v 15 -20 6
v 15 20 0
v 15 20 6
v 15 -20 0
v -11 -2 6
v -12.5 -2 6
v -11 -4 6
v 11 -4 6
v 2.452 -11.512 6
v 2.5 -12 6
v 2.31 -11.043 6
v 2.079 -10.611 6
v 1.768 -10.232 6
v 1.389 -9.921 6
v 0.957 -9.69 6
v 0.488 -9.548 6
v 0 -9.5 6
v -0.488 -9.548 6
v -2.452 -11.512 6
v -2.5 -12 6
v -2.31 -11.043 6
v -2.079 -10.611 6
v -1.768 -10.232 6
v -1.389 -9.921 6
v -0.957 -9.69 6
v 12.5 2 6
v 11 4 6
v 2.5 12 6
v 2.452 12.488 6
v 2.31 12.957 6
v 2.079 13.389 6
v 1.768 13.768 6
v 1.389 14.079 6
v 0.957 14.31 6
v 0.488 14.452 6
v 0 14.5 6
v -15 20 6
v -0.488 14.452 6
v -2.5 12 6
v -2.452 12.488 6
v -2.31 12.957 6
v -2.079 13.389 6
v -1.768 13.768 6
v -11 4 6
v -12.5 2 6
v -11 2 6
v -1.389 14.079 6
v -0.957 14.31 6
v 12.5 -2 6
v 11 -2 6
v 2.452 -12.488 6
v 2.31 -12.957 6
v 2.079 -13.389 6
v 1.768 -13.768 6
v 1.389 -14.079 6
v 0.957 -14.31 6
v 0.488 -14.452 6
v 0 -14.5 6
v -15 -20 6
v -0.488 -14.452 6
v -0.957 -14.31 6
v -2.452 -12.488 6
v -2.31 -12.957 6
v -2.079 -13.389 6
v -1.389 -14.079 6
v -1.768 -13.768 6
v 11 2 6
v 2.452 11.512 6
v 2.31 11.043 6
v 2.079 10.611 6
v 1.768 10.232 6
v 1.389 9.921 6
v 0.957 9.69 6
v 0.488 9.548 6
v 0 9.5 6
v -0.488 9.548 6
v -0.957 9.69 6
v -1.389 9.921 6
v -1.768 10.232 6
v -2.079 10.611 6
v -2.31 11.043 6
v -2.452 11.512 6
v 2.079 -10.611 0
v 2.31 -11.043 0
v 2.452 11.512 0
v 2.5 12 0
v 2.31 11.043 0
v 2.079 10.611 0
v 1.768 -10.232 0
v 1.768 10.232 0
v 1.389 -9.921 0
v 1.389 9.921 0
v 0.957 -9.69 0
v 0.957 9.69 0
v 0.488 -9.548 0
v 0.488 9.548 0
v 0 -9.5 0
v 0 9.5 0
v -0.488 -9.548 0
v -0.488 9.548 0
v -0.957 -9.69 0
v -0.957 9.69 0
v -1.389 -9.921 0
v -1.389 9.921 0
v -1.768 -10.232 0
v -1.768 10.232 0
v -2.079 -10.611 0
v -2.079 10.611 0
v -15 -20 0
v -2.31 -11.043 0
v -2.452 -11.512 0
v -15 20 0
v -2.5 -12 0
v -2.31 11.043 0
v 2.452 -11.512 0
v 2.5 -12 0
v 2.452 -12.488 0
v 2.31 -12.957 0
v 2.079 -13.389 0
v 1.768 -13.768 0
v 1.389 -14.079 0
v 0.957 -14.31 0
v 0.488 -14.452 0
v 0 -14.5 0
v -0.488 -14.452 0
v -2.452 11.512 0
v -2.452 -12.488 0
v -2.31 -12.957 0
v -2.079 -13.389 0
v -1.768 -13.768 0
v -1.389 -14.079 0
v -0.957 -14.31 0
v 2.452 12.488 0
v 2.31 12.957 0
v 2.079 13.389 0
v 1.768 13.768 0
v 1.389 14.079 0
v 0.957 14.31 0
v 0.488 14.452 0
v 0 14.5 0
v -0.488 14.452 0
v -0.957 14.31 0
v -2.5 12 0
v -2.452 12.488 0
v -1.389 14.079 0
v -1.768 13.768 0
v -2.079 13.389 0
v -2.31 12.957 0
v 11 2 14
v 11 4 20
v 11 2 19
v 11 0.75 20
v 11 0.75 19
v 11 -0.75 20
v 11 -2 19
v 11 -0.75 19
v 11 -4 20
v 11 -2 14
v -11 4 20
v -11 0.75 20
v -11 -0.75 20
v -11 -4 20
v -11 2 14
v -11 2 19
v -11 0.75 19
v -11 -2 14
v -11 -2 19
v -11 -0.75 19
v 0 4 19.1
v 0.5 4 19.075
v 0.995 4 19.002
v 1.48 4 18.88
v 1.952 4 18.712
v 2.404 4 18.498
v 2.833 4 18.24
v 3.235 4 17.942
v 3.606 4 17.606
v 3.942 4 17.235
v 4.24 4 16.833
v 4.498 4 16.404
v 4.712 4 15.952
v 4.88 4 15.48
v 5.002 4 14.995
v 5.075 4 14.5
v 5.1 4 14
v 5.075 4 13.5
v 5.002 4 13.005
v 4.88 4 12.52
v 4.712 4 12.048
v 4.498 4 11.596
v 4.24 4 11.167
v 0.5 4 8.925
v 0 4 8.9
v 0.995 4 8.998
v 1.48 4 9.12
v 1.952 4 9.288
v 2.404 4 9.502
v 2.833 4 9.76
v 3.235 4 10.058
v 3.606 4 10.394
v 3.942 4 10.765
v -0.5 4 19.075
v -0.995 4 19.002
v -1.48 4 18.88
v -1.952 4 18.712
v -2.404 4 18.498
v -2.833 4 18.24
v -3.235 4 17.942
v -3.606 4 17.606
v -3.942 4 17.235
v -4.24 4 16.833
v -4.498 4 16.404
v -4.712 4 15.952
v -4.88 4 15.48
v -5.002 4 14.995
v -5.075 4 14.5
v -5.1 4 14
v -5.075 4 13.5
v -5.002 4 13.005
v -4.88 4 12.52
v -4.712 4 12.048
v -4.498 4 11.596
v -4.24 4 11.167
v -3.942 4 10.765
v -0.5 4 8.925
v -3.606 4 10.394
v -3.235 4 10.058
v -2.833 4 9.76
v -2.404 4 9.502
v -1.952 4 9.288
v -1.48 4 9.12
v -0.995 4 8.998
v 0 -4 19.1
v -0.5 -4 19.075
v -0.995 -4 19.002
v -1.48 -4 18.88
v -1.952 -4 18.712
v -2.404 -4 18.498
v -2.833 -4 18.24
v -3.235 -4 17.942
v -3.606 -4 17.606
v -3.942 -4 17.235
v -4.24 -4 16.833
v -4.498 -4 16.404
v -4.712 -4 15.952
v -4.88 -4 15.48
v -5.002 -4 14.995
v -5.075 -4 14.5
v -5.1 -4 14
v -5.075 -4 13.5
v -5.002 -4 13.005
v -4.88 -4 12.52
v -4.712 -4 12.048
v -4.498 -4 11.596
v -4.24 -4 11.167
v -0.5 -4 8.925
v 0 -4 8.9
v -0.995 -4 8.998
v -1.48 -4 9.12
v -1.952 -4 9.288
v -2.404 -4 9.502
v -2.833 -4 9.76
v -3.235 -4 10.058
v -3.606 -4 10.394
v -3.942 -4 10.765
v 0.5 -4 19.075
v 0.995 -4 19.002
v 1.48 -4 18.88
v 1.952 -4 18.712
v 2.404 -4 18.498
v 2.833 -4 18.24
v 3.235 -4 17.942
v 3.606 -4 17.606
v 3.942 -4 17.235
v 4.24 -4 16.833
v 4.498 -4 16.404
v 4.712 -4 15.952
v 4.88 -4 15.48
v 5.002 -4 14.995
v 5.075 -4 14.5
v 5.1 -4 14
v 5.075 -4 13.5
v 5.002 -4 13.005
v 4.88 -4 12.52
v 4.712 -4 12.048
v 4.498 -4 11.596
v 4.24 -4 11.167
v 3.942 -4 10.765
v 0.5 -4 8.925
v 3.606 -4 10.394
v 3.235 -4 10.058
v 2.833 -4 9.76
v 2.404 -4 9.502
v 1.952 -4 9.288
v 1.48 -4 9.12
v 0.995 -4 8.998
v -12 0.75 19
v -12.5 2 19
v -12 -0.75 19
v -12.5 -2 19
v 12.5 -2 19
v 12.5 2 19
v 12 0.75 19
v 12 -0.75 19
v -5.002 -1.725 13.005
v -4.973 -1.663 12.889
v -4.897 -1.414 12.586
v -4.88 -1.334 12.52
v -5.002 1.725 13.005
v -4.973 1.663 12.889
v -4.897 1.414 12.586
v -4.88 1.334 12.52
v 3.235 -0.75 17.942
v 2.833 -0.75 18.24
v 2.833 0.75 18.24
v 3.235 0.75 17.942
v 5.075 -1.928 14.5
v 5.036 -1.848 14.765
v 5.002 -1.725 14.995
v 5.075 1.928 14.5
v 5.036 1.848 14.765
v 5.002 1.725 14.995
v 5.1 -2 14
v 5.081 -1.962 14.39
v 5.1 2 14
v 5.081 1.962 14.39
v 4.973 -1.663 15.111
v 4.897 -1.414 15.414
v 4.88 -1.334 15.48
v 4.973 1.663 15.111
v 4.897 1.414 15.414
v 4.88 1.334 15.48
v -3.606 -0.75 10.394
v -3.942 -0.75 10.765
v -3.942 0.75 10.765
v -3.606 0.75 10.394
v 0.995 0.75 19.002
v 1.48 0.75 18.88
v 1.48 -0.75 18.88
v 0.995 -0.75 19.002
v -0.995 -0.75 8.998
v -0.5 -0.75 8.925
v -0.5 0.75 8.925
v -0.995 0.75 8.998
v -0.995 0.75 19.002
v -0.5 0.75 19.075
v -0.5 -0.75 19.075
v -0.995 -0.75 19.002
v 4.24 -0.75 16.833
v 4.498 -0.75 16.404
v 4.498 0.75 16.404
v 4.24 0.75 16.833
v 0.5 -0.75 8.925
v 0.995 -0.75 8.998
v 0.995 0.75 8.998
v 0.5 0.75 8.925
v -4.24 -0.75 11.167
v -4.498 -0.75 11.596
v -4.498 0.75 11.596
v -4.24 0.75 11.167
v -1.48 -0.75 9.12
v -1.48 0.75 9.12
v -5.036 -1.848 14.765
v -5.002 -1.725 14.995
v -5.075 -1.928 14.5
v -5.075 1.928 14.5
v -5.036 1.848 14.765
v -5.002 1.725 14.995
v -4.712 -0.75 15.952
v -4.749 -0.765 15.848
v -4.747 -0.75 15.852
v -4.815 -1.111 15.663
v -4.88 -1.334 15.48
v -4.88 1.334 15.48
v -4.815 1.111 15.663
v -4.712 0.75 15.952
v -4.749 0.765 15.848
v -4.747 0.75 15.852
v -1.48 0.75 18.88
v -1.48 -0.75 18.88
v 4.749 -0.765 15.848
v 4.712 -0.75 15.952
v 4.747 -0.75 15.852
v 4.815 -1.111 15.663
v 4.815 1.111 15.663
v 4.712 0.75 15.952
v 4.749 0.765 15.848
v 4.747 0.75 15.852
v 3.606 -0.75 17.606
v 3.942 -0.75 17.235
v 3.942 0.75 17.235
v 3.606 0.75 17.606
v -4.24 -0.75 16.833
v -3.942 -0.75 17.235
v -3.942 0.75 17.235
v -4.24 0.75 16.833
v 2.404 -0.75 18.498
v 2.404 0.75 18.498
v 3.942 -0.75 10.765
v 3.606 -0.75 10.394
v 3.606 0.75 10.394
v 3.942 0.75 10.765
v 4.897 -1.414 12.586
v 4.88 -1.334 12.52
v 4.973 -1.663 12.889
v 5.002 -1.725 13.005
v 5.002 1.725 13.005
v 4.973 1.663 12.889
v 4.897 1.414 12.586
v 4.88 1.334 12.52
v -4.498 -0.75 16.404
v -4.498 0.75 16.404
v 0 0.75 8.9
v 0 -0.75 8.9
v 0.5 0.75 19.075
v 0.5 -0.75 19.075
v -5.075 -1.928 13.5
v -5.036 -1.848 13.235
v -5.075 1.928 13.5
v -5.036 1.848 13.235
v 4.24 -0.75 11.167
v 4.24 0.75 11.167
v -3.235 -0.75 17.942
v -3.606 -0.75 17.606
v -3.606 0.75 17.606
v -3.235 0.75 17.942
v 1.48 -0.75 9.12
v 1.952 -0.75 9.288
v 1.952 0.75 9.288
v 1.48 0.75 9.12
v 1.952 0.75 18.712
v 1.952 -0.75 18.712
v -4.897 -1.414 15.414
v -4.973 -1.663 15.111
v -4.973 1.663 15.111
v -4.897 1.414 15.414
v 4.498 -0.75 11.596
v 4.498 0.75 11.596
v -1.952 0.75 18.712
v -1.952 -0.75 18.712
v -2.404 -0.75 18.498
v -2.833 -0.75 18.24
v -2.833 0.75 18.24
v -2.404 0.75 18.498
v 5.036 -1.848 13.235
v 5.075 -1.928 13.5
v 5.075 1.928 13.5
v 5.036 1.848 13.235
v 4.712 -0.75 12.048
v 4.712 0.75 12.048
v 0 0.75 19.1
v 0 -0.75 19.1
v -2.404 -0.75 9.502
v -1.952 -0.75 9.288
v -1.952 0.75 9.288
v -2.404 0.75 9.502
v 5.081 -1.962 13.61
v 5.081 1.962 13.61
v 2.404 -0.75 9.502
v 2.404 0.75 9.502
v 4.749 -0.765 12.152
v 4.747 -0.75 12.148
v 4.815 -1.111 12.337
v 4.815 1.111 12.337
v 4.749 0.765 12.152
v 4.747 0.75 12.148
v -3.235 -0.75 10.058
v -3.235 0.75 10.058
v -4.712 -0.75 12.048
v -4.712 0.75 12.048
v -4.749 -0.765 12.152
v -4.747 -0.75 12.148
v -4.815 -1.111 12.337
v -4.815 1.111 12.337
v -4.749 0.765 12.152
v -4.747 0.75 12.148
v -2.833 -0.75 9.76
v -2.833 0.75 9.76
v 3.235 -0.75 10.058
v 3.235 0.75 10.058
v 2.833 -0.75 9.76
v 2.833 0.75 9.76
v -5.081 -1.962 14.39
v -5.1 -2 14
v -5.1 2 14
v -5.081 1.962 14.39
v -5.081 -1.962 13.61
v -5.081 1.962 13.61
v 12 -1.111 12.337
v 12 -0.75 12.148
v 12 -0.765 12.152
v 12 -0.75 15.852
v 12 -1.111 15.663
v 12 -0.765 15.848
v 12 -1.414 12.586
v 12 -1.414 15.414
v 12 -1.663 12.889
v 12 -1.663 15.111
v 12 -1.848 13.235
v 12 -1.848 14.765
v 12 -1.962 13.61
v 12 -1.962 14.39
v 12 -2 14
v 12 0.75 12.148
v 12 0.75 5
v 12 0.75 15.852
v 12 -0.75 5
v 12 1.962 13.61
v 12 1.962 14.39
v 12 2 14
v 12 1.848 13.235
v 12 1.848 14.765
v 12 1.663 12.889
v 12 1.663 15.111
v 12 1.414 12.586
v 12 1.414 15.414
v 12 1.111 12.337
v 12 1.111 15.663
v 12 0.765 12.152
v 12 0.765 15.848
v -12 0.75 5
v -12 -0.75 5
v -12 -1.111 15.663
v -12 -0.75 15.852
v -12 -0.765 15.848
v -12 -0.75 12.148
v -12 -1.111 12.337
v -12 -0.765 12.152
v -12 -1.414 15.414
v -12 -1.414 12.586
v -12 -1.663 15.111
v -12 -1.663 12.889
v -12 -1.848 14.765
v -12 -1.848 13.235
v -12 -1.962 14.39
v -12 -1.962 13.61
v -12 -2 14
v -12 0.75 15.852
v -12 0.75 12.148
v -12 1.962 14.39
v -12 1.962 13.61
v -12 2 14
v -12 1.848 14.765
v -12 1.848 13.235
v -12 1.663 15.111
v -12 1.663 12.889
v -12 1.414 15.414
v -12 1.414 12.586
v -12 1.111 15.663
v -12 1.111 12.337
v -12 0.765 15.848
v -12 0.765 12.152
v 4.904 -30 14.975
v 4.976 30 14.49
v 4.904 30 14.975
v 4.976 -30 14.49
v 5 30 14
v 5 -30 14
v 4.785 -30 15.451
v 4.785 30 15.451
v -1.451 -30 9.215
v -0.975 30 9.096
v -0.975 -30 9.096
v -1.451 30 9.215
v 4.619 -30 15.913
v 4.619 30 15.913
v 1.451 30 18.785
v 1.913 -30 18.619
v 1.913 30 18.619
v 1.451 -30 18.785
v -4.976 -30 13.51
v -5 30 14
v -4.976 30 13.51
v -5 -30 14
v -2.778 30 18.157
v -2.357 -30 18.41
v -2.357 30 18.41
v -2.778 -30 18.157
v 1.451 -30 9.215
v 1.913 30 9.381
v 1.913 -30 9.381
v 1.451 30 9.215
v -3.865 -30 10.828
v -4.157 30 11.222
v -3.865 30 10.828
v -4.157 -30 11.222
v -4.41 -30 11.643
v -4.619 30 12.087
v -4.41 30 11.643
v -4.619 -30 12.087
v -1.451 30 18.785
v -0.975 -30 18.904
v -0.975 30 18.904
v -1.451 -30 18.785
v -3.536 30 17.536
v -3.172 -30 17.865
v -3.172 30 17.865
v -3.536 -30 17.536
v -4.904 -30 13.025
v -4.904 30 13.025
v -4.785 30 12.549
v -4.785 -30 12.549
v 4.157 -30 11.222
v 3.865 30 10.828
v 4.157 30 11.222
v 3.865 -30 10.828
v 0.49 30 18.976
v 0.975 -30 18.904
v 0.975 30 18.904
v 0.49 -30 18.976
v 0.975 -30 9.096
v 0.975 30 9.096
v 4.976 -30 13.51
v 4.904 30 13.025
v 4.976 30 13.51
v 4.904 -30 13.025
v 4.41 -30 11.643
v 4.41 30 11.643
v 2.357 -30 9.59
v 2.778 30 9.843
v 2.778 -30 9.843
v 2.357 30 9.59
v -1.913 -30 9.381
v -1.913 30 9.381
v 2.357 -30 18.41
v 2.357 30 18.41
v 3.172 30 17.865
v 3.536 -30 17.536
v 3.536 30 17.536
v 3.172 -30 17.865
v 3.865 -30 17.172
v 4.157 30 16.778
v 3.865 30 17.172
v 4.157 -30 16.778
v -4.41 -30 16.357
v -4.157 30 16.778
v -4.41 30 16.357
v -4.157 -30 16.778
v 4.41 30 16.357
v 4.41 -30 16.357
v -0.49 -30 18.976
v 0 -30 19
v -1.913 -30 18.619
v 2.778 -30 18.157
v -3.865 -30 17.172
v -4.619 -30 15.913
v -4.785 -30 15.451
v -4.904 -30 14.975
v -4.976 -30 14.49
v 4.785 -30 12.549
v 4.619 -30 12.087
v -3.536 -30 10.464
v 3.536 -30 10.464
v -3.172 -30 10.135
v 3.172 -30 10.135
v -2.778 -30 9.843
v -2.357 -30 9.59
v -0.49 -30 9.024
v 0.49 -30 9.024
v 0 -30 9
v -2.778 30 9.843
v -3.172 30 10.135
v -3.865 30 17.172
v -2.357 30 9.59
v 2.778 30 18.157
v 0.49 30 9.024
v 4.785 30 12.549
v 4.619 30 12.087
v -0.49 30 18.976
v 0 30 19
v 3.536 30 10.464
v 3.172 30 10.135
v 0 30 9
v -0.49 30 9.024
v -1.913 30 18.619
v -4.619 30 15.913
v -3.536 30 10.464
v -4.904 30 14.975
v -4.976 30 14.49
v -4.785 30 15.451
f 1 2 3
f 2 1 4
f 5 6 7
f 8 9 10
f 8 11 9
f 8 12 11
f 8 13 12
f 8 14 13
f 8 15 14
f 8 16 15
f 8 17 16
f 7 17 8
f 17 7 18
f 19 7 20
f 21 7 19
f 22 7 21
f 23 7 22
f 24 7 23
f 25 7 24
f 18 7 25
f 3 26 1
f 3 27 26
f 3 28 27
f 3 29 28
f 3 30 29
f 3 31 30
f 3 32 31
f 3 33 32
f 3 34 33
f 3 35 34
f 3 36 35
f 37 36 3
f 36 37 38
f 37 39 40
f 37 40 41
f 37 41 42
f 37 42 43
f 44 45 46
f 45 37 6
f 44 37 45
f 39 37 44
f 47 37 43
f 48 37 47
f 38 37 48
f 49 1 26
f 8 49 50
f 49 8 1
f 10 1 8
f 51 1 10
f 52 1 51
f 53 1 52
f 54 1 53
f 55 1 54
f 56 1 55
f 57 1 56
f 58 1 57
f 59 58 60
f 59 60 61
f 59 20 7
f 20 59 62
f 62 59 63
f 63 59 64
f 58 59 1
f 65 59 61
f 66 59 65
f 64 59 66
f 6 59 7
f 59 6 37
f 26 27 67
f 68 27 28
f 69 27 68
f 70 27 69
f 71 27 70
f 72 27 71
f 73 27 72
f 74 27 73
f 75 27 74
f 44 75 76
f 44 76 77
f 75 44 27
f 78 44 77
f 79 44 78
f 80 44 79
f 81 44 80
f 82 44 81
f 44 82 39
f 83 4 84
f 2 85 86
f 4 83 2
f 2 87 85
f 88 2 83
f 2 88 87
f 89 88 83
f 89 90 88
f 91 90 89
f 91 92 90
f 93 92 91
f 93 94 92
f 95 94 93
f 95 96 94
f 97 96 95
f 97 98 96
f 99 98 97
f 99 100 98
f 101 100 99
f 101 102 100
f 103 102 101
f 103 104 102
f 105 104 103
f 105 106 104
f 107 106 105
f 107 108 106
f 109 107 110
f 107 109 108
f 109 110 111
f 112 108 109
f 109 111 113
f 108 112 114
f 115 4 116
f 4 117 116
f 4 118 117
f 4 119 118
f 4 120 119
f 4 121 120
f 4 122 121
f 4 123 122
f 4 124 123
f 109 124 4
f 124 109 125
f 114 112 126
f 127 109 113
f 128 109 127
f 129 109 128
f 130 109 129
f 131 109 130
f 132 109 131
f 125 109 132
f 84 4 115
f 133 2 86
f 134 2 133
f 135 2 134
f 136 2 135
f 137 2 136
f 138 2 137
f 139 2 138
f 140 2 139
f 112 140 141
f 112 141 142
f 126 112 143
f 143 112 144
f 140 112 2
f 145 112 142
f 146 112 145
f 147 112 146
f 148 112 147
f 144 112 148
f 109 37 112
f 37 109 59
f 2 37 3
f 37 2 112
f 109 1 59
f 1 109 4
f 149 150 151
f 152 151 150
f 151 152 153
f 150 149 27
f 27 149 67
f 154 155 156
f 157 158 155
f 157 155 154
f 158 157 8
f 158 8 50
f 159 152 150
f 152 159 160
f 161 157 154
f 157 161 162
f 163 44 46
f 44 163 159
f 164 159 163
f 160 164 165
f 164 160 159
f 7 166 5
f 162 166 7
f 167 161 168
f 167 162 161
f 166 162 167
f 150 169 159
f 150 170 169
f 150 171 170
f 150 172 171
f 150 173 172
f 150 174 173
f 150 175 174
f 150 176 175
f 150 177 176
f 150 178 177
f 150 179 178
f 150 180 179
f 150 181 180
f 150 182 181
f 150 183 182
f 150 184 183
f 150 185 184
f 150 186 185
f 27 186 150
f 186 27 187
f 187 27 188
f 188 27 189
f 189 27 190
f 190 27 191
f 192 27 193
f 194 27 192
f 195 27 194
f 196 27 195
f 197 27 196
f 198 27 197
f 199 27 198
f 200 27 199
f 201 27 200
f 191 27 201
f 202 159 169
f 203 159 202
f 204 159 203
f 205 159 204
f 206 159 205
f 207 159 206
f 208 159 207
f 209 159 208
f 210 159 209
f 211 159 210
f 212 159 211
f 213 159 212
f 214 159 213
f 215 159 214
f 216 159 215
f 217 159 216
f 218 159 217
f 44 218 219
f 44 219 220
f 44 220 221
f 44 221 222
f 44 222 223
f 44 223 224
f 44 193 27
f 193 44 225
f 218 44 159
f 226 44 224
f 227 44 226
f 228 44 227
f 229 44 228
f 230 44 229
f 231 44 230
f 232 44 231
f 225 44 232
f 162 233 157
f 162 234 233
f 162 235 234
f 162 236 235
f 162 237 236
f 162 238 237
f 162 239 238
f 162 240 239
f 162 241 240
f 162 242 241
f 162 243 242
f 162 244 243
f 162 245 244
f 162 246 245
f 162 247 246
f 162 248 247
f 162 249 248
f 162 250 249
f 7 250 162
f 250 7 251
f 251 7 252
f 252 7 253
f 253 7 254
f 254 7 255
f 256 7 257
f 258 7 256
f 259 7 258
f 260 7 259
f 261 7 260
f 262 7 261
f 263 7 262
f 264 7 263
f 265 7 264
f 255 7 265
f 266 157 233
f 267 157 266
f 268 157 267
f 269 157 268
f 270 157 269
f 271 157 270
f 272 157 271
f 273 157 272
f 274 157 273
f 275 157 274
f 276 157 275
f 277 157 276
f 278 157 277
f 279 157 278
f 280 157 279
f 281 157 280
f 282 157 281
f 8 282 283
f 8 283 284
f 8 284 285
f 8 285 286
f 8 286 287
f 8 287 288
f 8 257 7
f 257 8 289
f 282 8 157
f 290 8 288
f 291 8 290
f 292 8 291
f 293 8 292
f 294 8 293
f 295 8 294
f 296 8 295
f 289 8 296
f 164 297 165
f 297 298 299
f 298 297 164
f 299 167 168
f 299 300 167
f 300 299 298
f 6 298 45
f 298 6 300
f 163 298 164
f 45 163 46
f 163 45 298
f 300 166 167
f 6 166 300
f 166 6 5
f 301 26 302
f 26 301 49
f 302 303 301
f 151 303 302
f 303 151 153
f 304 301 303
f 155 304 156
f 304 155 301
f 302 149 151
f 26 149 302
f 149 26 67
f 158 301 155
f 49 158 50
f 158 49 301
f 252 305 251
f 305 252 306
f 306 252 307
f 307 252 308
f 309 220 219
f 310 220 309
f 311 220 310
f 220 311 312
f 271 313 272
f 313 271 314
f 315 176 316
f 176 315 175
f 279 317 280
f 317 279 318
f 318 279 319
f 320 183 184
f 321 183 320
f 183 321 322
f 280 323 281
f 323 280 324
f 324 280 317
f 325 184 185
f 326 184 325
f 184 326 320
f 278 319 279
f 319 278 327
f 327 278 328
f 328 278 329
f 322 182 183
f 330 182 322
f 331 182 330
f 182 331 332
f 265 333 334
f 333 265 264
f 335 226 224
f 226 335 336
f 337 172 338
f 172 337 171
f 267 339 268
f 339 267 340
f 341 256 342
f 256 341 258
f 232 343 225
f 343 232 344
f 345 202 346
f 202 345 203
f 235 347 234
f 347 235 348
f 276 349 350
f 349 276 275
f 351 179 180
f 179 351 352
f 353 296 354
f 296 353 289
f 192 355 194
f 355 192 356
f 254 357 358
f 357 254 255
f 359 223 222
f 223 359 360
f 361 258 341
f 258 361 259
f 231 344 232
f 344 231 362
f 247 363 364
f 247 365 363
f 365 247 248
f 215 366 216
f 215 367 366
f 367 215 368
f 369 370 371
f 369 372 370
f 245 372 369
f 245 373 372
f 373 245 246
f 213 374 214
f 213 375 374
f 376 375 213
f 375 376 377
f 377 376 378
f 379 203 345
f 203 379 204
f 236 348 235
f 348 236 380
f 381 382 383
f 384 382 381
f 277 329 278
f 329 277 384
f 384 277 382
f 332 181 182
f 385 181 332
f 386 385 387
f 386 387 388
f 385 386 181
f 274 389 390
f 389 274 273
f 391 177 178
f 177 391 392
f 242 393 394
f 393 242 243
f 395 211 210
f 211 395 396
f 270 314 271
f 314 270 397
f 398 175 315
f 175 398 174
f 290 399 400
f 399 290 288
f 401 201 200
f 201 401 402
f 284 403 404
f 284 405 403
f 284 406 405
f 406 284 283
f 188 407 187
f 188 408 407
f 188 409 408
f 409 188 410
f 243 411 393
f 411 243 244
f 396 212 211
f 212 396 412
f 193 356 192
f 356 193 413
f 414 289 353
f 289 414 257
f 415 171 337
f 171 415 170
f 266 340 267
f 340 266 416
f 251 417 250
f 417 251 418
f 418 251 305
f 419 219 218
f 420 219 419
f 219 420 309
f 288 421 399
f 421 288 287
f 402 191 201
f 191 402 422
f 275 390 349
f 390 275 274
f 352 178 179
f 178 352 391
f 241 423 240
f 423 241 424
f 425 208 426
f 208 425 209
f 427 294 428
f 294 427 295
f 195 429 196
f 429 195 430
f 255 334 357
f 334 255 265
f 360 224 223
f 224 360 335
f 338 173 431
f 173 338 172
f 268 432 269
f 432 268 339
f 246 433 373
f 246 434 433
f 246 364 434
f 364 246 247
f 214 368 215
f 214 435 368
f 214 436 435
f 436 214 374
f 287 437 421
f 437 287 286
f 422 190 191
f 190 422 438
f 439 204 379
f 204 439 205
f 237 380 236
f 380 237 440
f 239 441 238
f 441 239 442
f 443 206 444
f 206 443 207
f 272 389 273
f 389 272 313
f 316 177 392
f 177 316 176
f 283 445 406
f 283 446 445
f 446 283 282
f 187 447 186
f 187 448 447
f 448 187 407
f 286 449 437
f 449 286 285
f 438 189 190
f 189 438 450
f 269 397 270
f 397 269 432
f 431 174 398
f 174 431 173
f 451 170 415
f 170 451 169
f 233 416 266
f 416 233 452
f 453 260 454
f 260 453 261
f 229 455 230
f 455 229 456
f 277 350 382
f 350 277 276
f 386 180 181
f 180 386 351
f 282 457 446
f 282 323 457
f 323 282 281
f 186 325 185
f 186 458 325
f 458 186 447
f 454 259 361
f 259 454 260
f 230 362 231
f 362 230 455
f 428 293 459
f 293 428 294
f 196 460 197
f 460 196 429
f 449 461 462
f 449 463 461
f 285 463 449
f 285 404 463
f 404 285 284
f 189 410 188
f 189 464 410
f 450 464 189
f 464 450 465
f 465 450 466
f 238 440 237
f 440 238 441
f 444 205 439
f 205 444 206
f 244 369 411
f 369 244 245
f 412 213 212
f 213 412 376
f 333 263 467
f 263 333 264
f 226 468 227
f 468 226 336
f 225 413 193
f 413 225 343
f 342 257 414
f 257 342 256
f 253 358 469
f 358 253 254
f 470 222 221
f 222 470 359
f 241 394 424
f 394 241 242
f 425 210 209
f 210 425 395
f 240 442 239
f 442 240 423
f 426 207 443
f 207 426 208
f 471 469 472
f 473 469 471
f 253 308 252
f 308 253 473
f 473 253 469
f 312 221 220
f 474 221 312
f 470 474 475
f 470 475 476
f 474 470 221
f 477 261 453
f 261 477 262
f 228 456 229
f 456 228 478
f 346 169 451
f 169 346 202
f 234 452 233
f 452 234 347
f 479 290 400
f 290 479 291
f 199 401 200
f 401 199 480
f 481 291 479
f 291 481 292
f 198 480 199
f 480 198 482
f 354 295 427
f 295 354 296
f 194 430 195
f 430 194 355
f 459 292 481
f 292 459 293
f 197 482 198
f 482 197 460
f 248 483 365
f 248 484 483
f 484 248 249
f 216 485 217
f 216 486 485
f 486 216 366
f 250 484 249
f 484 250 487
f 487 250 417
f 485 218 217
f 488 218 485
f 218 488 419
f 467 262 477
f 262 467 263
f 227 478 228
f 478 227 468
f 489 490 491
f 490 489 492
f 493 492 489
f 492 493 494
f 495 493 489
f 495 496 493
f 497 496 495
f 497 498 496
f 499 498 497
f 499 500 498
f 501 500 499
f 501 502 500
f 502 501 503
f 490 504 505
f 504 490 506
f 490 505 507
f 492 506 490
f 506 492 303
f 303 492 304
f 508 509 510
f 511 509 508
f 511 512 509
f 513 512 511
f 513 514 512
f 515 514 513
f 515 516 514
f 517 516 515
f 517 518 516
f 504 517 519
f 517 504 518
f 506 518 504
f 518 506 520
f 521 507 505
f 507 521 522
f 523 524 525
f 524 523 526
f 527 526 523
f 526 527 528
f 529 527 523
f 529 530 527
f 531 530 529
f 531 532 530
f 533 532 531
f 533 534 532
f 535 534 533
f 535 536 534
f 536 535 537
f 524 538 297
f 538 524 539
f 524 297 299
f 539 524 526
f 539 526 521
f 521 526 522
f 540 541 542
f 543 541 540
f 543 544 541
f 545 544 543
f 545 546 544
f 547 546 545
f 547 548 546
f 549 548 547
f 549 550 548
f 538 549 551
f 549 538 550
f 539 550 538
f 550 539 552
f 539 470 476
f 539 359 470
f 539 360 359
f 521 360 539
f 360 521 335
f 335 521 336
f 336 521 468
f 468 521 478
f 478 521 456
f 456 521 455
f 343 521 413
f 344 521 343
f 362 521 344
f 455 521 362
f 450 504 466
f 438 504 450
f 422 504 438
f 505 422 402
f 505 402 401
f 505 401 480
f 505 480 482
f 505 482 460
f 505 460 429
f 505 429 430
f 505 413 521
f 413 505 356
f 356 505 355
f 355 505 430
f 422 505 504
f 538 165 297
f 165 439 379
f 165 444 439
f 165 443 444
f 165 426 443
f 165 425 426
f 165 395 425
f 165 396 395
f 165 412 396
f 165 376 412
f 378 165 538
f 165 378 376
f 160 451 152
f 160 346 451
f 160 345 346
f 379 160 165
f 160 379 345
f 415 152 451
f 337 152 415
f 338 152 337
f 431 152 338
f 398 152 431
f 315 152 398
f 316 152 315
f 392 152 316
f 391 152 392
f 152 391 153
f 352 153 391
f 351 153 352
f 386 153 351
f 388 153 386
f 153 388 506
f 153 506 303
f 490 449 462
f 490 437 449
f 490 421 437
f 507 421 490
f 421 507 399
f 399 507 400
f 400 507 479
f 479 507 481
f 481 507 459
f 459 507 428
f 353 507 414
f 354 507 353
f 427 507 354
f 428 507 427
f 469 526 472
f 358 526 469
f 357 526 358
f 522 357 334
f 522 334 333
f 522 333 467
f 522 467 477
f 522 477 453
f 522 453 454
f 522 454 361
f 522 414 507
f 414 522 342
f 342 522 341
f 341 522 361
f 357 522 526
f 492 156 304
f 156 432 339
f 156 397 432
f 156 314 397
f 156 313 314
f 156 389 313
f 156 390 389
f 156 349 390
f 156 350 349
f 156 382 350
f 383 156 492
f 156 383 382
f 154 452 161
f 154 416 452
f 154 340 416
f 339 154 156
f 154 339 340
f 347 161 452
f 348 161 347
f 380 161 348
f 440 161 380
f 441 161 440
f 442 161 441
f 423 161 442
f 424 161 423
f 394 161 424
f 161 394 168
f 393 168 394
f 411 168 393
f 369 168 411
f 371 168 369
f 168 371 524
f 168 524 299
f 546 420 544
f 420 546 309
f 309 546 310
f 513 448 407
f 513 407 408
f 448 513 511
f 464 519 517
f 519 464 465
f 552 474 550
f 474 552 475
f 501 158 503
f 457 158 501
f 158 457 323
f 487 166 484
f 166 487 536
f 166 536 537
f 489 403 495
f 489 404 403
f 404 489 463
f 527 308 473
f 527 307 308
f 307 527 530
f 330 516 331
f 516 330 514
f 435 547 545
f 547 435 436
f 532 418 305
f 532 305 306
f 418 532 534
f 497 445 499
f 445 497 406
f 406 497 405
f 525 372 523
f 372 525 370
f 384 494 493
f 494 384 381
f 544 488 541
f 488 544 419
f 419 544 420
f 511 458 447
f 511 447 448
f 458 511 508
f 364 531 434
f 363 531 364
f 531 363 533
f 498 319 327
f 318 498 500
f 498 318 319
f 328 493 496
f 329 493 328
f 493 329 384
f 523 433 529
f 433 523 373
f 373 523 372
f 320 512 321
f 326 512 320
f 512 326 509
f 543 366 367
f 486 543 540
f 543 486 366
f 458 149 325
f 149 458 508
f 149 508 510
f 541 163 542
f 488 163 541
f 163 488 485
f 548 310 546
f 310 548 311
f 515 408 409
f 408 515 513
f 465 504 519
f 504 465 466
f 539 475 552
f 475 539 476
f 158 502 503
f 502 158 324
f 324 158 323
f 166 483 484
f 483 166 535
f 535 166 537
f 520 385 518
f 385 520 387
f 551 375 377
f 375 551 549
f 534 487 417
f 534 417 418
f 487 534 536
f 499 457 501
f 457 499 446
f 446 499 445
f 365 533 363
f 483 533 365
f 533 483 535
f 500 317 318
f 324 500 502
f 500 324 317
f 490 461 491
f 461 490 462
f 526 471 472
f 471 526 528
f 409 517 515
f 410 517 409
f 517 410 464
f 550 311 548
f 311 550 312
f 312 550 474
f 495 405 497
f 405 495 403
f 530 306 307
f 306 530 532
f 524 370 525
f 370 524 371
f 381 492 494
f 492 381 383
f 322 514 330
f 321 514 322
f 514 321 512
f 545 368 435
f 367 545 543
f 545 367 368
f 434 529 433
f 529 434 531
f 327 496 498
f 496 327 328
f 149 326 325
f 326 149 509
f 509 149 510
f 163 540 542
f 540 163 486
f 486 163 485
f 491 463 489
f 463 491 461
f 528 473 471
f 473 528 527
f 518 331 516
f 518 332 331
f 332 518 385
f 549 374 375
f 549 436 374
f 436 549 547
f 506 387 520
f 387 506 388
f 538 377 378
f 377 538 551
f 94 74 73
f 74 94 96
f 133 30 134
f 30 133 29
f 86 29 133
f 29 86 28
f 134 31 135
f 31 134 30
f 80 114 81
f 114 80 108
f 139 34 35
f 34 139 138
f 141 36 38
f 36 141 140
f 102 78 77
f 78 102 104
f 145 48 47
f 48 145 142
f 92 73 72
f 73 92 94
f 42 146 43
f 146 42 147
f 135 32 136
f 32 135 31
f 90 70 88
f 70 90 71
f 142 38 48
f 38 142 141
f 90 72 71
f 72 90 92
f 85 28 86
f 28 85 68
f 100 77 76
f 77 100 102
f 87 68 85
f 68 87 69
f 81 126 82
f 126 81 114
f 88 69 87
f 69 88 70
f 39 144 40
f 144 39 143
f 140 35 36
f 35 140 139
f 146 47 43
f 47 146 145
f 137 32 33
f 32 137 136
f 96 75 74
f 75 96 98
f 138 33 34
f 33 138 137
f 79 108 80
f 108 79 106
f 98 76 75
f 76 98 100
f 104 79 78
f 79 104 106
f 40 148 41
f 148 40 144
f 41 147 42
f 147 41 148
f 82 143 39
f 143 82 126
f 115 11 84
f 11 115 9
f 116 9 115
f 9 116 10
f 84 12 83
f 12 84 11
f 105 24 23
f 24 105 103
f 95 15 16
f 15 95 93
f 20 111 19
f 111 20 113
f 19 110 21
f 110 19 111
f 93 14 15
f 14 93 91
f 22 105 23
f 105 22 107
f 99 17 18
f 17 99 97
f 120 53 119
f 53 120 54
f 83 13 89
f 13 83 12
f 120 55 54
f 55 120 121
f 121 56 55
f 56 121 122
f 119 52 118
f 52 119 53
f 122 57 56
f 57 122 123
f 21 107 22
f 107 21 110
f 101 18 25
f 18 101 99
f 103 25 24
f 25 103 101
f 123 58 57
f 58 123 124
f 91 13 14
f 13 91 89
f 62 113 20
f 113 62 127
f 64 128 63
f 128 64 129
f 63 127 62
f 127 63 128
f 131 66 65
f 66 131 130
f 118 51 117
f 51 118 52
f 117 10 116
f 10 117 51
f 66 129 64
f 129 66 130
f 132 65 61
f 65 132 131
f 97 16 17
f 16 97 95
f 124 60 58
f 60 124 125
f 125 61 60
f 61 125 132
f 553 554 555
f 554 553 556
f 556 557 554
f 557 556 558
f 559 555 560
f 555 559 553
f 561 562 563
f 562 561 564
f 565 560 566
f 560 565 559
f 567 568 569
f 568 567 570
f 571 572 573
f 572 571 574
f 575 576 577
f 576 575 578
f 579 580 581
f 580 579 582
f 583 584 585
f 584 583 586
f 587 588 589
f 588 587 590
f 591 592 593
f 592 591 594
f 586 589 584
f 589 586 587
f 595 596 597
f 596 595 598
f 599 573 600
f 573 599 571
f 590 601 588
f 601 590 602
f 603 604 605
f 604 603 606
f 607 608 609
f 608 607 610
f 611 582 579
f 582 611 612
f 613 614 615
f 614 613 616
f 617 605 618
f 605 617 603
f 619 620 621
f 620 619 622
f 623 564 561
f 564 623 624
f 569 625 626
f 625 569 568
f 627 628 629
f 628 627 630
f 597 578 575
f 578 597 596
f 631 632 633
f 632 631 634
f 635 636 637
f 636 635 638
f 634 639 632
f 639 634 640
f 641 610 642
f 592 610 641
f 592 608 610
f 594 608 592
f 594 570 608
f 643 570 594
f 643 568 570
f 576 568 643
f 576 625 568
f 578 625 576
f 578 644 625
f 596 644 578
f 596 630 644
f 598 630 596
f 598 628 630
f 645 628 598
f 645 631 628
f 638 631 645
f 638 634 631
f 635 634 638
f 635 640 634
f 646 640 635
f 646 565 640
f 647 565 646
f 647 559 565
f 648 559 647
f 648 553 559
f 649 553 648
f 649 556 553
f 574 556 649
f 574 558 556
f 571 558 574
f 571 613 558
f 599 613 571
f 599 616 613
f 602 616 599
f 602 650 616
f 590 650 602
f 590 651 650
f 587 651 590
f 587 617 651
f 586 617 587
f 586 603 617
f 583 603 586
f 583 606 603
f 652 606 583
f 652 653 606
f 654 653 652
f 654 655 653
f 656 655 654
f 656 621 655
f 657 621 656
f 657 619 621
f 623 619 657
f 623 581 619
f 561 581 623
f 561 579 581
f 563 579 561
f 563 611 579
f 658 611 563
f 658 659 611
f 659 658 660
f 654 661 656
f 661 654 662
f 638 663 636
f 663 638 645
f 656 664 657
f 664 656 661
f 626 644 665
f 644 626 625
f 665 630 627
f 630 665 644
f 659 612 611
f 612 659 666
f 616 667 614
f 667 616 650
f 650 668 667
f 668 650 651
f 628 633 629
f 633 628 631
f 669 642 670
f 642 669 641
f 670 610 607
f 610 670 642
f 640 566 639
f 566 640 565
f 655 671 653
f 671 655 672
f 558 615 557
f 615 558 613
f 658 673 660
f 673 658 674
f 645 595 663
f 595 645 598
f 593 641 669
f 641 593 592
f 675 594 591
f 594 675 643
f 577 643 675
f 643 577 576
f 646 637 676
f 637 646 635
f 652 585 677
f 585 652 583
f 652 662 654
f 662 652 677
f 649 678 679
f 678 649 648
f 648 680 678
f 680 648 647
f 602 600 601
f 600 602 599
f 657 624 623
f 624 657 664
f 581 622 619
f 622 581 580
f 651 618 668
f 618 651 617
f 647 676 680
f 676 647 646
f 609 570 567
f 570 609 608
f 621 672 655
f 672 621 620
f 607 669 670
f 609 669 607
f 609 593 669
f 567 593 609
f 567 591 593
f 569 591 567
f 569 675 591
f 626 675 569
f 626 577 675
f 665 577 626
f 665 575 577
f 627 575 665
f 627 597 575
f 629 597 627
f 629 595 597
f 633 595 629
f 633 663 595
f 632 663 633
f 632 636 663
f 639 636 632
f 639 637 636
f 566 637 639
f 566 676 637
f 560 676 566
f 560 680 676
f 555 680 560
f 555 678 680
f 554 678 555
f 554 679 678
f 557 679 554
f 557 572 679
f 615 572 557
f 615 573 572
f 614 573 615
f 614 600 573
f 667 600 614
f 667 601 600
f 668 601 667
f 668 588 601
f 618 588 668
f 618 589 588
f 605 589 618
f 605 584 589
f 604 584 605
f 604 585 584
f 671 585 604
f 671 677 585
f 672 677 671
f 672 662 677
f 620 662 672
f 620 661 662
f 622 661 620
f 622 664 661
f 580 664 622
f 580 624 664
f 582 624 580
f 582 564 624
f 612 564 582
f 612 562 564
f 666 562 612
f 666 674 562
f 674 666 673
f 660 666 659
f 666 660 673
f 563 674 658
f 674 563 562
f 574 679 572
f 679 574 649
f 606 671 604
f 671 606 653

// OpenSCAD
// Parameters
rod_diameter = 10; //[5:20:0.1]
bracket_height = 20; //[10:40:0.5]
base_width = 30; //[15:60:0.5]
base_length = 40; //[20:80:0.5]
body_thickness = 8; //[4:16:0.5]
rod_clearance = 0.2; //[0:0.6:0.05]
mount_hole_diameter = 5; //[3:8:0.1]
mount_hole_spacing = 24; //[12:48:0.5]
edge_margin = 5; //[2.5:10:0.5]
clamp_screw_diameter = 4; //[2:6:0.1]
gusset_thickness = 4; //[2:8:0.5]
base_thickness = 6; //[3:12:0.5]
overlap = 1; //[0.5:2:0.1]
bore_center_z = 14; //[10:18:0.5]
upright_width = 22; //[12:40:0.5]
rod_length = 60; //[30:120:1]
split_gap = 1.5; //[0.8:3:0.1]

// Rod - complete geometry
module rod() {
  color("Silver") {
    cylinder(r=rod_diameter/2, h=rod_length, center=true, $fn=64);
  }
}

// Bracket - complete geometry
module bracket() {
  color("Silver") difference() {
    union() {
      // Base plate
      translate([0, 0, base_thickness/2])
        cube([base_width, base_length, base_thickness], center=true);
      
      // Upright block
      translate([0, 0, base_thickness + (bracket_height - base_thickness + overlap)/2 - overlap])
        cube([upright_width, body_thickness, bracket_height - base_thickness + overlap], center=true);
      
      // Gusset left
      translate([-(base_width/2 - (base_width/2 - edge_margin)/2 - edge_margin/2), 0, base_thickness + (bracket_height - base_thickness)/2 - overlap])
        cube([base_width/2 - edge_margin, gusset_thickness, bracket_height - base_thickness], center=true);
      
      // Gusset right
      translate([(base_width/2 - (base_width/2 - edge_margin)/2 - edge_margin/2), 0, base_thickness + (bracket_height - base_thickness)/2 - overlap])
        cube([base_width/2 - edge_margin, gusset_thickness, bracket_height - base_thickness], center=true);
    }
    
    // Rod bore cutter
    translate([0, 0, bore_center_z])
      rotate([90, 0, 0])
      cylinder(r=(rod_diameter + rod_clearance)/2, h=body_thickness + 2*overlap, center=true, $fn=64);
    
    // Clamp split cutter
    translate([0, 0, base_thickness + (bracket_height - base_thickness)/2])
      cube([upright_width + 2*overlap, split_gap, bracket_height - base_thickness + 2*overlap], center=true);
    
    // Clamp screw cutter
    translate([0, 0, bore_center_z])
      rotate([0, 90, 0])
      cylinder(r=clamp_screw_diameter/2, h=upright_width + 2*overlap, center=true, $fn=32);
    
    // Mount hole cutter 1
    translate([0, mount_hole_spacing/2, base_thickness/2])
      cylinder(r=mount_hole_diameter/2, h=base_thickness + 2*overlap, center=true, $fn=32);
    
    // Mount hole cutter 2
    translate([0, -mount_hole_spacing/2, base_thickness/2])
      cylinder(r=mount_hole_diameter/2, h=base_thickness + 2*overlap, center=true, $fn=32);
  }
}

// Assembly
module assembly() {
  bracket();
  translate([0, 0, bore_center_z]) rotate([90, 0, 0]) rod();
}

assembly();
